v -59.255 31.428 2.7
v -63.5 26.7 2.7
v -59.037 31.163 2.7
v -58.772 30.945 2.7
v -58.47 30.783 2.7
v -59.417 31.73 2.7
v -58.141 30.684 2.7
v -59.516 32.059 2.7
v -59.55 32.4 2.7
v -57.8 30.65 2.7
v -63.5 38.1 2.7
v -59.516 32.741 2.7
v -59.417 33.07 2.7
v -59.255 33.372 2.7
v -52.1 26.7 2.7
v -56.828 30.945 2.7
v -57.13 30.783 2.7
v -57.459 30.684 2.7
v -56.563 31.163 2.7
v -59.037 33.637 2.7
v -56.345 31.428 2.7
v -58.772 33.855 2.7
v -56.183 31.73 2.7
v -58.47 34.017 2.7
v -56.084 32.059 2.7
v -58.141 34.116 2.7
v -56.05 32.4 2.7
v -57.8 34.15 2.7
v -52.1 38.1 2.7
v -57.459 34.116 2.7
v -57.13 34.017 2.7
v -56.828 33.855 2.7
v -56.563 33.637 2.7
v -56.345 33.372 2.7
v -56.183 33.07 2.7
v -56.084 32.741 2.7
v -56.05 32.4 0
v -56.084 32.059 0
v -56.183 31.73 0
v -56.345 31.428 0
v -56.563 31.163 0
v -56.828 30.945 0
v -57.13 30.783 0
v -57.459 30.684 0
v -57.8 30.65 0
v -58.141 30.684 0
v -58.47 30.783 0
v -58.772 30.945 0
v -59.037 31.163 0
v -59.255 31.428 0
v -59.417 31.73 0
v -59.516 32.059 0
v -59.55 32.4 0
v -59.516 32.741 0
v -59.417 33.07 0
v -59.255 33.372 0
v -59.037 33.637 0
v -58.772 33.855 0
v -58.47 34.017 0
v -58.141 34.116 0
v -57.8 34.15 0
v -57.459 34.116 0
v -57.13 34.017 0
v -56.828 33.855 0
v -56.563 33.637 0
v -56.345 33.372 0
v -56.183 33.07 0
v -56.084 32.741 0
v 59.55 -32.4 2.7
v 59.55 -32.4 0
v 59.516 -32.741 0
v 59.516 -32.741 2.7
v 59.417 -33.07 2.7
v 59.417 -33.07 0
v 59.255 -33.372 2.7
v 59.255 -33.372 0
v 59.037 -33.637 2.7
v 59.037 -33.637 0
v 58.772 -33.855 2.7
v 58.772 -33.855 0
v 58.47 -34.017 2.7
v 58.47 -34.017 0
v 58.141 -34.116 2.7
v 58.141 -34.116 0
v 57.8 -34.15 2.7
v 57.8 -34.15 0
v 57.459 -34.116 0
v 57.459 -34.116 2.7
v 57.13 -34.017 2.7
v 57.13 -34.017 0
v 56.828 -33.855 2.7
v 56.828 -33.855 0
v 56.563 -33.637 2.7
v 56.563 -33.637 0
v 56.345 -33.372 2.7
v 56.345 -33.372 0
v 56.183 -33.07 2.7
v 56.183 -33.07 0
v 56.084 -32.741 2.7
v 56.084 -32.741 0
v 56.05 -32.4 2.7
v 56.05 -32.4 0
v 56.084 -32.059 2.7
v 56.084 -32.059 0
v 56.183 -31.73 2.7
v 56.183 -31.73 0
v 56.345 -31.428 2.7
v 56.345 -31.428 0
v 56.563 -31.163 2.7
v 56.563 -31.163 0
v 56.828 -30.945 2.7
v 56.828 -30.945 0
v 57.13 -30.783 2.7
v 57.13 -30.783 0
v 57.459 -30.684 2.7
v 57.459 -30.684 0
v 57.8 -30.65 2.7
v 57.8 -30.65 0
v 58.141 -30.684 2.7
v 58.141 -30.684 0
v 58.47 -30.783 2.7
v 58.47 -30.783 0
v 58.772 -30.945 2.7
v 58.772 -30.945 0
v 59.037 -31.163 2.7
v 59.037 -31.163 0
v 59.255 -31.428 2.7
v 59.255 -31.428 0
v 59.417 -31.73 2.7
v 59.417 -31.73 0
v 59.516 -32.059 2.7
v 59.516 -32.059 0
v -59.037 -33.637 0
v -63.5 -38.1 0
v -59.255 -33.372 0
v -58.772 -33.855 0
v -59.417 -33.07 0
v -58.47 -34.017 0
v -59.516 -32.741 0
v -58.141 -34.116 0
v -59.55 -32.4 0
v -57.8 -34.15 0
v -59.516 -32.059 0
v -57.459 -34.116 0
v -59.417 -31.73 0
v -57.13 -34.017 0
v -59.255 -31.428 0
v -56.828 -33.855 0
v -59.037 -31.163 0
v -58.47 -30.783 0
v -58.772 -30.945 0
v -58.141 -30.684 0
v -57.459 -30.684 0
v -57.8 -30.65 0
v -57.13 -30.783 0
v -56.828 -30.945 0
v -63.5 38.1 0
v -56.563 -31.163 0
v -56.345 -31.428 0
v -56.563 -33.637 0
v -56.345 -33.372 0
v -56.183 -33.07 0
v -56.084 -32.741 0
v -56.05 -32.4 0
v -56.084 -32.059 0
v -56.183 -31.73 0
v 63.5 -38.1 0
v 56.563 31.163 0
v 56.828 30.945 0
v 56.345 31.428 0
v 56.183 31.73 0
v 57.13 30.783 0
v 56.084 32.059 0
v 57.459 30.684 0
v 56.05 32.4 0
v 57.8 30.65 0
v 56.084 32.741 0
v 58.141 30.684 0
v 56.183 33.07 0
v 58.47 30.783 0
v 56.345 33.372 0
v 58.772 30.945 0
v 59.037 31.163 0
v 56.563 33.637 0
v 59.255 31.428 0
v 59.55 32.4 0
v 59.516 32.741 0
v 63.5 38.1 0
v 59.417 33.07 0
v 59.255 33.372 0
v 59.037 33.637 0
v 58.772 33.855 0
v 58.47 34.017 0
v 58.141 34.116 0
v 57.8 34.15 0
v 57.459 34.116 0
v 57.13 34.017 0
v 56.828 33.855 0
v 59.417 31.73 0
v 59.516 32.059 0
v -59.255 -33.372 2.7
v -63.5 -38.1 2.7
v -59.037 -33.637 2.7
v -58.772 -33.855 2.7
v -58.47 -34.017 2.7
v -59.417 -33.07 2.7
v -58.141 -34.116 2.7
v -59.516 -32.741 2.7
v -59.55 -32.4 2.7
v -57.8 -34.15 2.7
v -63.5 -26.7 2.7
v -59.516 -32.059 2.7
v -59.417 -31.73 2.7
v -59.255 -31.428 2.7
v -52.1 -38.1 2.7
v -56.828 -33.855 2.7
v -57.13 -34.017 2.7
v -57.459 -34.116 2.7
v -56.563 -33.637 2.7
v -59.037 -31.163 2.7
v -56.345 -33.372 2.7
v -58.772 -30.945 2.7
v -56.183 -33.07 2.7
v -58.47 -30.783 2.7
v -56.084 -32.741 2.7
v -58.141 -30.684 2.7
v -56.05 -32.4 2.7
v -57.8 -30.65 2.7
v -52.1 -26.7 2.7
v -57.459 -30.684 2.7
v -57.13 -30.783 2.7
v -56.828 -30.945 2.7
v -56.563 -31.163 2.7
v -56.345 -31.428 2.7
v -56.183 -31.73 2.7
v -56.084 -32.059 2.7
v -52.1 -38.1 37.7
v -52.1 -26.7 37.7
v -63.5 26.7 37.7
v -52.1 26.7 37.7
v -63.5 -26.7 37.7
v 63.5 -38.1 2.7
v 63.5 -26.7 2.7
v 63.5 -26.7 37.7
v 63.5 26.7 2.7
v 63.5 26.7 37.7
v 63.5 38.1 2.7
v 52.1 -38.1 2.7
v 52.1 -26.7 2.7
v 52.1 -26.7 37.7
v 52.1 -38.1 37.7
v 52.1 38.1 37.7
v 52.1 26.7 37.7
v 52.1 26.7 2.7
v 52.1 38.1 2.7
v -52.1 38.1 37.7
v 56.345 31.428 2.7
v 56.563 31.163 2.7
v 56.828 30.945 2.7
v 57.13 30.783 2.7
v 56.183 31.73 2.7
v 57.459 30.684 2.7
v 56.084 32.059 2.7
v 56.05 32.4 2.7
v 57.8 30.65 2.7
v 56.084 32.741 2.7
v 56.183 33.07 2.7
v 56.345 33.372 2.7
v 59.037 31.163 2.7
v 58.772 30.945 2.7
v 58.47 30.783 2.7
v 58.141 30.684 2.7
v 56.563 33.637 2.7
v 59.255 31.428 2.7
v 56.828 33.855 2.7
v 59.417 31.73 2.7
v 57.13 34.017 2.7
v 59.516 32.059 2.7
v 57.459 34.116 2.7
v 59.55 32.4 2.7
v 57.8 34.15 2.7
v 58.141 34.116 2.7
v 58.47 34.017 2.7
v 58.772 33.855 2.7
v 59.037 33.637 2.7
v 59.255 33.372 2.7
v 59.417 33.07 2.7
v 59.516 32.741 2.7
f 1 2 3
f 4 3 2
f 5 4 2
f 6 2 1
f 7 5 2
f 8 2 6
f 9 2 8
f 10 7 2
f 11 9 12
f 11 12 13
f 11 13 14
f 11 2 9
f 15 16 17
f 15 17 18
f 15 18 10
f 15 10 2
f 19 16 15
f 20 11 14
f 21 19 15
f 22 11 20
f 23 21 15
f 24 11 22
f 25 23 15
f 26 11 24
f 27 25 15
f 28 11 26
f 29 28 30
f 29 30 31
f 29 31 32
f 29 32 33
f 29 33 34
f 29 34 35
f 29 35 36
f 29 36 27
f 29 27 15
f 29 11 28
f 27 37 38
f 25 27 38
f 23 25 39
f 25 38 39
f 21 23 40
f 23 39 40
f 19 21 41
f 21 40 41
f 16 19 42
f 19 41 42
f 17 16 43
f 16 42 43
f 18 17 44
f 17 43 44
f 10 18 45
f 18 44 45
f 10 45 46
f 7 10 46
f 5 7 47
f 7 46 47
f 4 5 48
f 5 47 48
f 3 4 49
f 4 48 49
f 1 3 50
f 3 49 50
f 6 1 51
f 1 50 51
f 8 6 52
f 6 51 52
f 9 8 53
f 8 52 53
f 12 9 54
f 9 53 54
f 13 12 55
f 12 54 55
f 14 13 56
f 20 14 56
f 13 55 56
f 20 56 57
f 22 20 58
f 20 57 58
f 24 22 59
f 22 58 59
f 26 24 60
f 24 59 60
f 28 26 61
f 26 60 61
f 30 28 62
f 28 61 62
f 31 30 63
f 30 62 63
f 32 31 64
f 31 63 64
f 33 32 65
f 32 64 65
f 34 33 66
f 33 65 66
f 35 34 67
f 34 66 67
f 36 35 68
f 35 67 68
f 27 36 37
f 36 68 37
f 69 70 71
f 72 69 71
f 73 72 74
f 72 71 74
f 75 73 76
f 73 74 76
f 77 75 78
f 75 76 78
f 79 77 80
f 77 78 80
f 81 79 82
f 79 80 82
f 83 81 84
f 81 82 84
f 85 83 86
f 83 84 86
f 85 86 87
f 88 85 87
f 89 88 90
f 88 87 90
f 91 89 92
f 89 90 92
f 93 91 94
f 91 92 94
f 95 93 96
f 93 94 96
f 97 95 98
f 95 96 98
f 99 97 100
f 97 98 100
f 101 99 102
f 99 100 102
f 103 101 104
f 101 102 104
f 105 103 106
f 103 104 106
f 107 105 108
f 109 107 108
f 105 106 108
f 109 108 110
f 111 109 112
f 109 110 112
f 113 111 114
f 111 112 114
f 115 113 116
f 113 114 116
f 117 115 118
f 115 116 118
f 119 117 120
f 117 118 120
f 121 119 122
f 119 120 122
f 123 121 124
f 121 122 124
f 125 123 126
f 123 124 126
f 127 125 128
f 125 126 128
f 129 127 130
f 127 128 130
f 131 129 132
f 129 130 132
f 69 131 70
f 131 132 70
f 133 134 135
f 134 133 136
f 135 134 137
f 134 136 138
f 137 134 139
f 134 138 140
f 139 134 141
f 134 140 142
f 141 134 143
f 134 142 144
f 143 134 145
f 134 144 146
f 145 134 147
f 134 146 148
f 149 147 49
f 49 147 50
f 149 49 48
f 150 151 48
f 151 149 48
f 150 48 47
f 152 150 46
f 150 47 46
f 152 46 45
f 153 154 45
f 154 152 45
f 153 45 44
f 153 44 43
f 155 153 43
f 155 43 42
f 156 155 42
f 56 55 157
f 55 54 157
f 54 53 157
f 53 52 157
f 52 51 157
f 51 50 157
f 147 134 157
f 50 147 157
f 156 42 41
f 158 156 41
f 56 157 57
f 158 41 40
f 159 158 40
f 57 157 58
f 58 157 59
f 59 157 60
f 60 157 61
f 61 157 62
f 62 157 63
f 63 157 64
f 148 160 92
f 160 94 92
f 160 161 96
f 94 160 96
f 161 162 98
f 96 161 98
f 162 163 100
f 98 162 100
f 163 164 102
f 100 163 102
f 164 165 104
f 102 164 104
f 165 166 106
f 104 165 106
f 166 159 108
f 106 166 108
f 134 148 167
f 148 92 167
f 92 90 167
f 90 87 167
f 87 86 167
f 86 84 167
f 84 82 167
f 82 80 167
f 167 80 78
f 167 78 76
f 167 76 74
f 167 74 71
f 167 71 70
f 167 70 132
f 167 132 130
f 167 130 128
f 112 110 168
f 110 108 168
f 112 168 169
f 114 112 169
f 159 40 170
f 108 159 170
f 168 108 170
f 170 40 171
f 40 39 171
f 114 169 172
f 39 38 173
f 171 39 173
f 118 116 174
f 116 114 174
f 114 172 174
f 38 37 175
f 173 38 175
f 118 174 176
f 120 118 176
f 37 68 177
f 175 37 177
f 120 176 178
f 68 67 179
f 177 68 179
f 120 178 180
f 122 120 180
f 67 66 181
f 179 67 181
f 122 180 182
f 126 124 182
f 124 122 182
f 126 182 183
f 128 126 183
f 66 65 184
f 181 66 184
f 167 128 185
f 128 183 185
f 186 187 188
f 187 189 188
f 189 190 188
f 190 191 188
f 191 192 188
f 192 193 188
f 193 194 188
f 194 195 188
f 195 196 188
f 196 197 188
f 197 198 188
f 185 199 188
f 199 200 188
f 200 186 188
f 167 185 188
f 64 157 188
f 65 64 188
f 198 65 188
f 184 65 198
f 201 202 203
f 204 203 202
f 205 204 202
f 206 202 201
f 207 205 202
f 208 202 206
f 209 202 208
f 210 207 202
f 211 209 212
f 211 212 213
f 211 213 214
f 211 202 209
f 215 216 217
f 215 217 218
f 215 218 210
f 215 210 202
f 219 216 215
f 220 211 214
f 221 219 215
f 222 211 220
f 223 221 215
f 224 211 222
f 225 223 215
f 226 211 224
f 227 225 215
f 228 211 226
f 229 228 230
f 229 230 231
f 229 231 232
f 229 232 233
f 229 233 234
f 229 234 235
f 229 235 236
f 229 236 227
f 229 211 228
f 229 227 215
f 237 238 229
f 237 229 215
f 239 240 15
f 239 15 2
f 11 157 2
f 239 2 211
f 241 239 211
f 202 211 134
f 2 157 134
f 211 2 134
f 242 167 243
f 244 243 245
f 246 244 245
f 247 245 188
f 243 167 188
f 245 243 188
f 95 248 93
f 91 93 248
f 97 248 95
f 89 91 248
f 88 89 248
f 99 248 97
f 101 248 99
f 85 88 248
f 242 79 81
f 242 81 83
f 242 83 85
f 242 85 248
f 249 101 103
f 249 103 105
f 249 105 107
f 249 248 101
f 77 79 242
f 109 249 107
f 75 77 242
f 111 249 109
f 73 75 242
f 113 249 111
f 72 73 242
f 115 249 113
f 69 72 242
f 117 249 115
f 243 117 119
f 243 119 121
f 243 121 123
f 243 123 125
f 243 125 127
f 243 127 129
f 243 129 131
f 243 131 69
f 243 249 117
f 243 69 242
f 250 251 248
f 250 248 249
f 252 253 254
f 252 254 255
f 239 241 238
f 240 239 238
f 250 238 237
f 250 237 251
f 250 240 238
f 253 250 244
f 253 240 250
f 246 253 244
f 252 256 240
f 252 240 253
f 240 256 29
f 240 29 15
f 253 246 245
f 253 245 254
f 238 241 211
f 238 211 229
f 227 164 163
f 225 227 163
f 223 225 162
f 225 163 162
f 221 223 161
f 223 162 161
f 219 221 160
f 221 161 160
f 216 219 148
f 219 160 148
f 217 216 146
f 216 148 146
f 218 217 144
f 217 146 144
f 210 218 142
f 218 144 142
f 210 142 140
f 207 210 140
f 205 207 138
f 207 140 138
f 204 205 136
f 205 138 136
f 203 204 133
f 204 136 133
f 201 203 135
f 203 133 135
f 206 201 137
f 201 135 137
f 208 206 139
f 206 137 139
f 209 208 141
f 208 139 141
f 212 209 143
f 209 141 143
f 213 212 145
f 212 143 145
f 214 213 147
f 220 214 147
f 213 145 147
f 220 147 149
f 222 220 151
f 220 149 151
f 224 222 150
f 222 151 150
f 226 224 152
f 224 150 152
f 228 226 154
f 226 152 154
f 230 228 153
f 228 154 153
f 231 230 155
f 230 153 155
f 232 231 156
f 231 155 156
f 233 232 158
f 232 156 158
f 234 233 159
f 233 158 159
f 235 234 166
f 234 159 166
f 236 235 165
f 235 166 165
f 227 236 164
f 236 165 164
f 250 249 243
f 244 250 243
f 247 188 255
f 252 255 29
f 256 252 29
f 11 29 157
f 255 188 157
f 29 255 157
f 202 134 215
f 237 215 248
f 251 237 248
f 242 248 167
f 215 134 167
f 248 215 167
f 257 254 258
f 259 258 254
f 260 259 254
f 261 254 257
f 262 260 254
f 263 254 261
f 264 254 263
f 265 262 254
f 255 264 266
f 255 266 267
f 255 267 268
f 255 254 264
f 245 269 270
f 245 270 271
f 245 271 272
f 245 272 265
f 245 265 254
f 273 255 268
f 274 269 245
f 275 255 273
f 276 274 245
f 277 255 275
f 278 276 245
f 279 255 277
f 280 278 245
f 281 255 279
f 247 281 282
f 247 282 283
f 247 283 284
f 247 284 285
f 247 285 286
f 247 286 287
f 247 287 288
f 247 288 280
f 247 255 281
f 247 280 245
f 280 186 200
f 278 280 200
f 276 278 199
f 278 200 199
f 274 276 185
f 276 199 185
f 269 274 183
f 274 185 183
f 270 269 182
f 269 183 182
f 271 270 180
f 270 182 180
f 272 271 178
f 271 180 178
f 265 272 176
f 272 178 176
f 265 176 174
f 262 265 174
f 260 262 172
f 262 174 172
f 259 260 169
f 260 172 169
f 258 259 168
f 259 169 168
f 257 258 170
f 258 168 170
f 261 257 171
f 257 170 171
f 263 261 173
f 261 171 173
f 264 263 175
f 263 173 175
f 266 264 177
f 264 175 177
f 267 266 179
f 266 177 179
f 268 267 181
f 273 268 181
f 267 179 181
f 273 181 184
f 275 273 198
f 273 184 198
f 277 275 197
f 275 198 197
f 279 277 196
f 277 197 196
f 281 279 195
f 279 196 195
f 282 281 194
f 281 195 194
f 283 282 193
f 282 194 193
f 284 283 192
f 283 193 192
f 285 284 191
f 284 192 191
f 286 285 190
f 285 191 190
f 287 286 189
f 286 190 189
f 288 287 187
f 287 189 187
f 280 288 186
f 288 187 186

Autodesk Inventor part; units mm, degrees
ref_plane "YZ Plane" through (0, 0, 0) normal (1, 0, 0) x (0, 1, 0)
ref_plane "XZ Plane" through (0, 0, 0) normal (0, 1, 0) x (-1, 0, 0)
ref_plane "XY Plane" through (0, 0, 0) normal (0, 0, 1) x (1, 0, 0)
sketch "Sketch1" plane through (0, 0, 0) normal (0, 0, 1) x (1, 0, 0)
  line L0 (-63.5, -38.1) -> (63.5, -38.1)
  line L1 (63.5, -38.1) -> (63.5, 38.1)
  line L2 (63.5, 38.1) -> (-63.5, 38.1)
  line L3 (-63.5, 38.1) -> (-63.5, -38.1)
  line L4 (-63.5, -38.1) -> (63.5, 38.1) construction
  line L5 (63.5, -38.1) -> (-63.5, 38.1) construction
  line L6 (-57.8, -32.4) -> (57.8, -32.4)
  line L7 (57.8, -32.4) -> (57.8, 32.4)
  line L8 (57.8, 32.4) -> (-57.8, 32.4)
  line L9 (-57.8, 32.4) -> (-57.8, -32.4)
  line L10 (-57.8, -32.4) -> (57.8, 32.4) construction
  line L11 (57.8, -32.4) -> (-57.8, 32.4) construction
  circle A0 centre (-57.8, 32.4) radius 1.75
  circle A1 centre (57.8, 32.4) radius 1.75
  circle A2 centre (57.8, -32.4) radius 1.75
  circle A3 centre (-57.8, -32.4) radius 1.75
  point P0 (0, 0)
  dimension "d0" = 127
  dimension "d1" = 76.2
  dimension "d2" = 115.6
  dimension "d3" = 64.8
  dimension "d4" = 3.5
extrude "Extrusion1" add sketch "Sketch1" along normal blind 2.7 contours L3 L2 L1 L0 | A3 L9 A0 L8 A1 L7 A2 L6
sketch "Sketch2" plane through (0, 0, 2.7) normal (0, 0, 1) x (1, 0, 0)
  line L0 (63.5, -38.1) -> (63.5, 38.1) projected
  line L1 (63.5, 38.1) -> (-63.5, 38.1) projected
  line L2 (-63.5, 38.1) -> (-63.5, -38.1) projected
  line L3 (-63.5, -38.1) -> (63.5, -38.1) projected
  circle A0 centre (57.8, -32.4) radius 1.75 projected
  circle A1 centre (57.8, 32.4) radius 1.75 projected
  circle A2 centre (-57.8, 32.4) radius 1.75 projected
  circle A3 centre (-57.8, -32.4) radius 1.75 projected
  line L4 (-52.1, -38.1) -> (52.1, -38.1)
  line L5 (52.1, -38.1) -> (52.1, 38.1)
  line L6 (52.1, 38.1) -> (-52.1, 38.1)
  line L7 (-52.1, 38.1) -> (-52.1, -38.1)
  line L8 (-52.1, -38.1) -> (52.1, 38.1) construction
  line L9 (52.1, -38.1) -> (-52.1, 38.1) construction
  line L10 (-63.5, -26.7) -> (63.5, -26.7)
  line L11 (63.5, -26.7) -> (63.5, 26.7)
  line L12 (63.5, 26.7) -> (-63.5, 26.7)
  line L13 (-63.5, 26.7) -> (-63.5, -26.7)
  line L14 (-63.5, -26.7) -> (63.5, 26.7) construction
  line L15 (63.5, -26.7) -> (-63.5, 26.7) construction
  point P0 (0, 0)
  point P1 (52.1, 26.7)
  point P2 (-52.1, 26.7)
  point P3 (-52.1, -26.7)
  point P4 (52.1, -26.7)
  dimension "d7" = 5.7
  dimension "d8" = 5.7
extrude "Extrusion2" add sketch "Sketch2" along normal blind 35 contours L10 L5 L12 L0 | L3 L7 L10 L5 | L10 L7 L12 L5 | L12 L7 L1 L5 | L10 L2 L12 L7
equation "\"d8\" = d7"
properties part number "EPP-400-24"
